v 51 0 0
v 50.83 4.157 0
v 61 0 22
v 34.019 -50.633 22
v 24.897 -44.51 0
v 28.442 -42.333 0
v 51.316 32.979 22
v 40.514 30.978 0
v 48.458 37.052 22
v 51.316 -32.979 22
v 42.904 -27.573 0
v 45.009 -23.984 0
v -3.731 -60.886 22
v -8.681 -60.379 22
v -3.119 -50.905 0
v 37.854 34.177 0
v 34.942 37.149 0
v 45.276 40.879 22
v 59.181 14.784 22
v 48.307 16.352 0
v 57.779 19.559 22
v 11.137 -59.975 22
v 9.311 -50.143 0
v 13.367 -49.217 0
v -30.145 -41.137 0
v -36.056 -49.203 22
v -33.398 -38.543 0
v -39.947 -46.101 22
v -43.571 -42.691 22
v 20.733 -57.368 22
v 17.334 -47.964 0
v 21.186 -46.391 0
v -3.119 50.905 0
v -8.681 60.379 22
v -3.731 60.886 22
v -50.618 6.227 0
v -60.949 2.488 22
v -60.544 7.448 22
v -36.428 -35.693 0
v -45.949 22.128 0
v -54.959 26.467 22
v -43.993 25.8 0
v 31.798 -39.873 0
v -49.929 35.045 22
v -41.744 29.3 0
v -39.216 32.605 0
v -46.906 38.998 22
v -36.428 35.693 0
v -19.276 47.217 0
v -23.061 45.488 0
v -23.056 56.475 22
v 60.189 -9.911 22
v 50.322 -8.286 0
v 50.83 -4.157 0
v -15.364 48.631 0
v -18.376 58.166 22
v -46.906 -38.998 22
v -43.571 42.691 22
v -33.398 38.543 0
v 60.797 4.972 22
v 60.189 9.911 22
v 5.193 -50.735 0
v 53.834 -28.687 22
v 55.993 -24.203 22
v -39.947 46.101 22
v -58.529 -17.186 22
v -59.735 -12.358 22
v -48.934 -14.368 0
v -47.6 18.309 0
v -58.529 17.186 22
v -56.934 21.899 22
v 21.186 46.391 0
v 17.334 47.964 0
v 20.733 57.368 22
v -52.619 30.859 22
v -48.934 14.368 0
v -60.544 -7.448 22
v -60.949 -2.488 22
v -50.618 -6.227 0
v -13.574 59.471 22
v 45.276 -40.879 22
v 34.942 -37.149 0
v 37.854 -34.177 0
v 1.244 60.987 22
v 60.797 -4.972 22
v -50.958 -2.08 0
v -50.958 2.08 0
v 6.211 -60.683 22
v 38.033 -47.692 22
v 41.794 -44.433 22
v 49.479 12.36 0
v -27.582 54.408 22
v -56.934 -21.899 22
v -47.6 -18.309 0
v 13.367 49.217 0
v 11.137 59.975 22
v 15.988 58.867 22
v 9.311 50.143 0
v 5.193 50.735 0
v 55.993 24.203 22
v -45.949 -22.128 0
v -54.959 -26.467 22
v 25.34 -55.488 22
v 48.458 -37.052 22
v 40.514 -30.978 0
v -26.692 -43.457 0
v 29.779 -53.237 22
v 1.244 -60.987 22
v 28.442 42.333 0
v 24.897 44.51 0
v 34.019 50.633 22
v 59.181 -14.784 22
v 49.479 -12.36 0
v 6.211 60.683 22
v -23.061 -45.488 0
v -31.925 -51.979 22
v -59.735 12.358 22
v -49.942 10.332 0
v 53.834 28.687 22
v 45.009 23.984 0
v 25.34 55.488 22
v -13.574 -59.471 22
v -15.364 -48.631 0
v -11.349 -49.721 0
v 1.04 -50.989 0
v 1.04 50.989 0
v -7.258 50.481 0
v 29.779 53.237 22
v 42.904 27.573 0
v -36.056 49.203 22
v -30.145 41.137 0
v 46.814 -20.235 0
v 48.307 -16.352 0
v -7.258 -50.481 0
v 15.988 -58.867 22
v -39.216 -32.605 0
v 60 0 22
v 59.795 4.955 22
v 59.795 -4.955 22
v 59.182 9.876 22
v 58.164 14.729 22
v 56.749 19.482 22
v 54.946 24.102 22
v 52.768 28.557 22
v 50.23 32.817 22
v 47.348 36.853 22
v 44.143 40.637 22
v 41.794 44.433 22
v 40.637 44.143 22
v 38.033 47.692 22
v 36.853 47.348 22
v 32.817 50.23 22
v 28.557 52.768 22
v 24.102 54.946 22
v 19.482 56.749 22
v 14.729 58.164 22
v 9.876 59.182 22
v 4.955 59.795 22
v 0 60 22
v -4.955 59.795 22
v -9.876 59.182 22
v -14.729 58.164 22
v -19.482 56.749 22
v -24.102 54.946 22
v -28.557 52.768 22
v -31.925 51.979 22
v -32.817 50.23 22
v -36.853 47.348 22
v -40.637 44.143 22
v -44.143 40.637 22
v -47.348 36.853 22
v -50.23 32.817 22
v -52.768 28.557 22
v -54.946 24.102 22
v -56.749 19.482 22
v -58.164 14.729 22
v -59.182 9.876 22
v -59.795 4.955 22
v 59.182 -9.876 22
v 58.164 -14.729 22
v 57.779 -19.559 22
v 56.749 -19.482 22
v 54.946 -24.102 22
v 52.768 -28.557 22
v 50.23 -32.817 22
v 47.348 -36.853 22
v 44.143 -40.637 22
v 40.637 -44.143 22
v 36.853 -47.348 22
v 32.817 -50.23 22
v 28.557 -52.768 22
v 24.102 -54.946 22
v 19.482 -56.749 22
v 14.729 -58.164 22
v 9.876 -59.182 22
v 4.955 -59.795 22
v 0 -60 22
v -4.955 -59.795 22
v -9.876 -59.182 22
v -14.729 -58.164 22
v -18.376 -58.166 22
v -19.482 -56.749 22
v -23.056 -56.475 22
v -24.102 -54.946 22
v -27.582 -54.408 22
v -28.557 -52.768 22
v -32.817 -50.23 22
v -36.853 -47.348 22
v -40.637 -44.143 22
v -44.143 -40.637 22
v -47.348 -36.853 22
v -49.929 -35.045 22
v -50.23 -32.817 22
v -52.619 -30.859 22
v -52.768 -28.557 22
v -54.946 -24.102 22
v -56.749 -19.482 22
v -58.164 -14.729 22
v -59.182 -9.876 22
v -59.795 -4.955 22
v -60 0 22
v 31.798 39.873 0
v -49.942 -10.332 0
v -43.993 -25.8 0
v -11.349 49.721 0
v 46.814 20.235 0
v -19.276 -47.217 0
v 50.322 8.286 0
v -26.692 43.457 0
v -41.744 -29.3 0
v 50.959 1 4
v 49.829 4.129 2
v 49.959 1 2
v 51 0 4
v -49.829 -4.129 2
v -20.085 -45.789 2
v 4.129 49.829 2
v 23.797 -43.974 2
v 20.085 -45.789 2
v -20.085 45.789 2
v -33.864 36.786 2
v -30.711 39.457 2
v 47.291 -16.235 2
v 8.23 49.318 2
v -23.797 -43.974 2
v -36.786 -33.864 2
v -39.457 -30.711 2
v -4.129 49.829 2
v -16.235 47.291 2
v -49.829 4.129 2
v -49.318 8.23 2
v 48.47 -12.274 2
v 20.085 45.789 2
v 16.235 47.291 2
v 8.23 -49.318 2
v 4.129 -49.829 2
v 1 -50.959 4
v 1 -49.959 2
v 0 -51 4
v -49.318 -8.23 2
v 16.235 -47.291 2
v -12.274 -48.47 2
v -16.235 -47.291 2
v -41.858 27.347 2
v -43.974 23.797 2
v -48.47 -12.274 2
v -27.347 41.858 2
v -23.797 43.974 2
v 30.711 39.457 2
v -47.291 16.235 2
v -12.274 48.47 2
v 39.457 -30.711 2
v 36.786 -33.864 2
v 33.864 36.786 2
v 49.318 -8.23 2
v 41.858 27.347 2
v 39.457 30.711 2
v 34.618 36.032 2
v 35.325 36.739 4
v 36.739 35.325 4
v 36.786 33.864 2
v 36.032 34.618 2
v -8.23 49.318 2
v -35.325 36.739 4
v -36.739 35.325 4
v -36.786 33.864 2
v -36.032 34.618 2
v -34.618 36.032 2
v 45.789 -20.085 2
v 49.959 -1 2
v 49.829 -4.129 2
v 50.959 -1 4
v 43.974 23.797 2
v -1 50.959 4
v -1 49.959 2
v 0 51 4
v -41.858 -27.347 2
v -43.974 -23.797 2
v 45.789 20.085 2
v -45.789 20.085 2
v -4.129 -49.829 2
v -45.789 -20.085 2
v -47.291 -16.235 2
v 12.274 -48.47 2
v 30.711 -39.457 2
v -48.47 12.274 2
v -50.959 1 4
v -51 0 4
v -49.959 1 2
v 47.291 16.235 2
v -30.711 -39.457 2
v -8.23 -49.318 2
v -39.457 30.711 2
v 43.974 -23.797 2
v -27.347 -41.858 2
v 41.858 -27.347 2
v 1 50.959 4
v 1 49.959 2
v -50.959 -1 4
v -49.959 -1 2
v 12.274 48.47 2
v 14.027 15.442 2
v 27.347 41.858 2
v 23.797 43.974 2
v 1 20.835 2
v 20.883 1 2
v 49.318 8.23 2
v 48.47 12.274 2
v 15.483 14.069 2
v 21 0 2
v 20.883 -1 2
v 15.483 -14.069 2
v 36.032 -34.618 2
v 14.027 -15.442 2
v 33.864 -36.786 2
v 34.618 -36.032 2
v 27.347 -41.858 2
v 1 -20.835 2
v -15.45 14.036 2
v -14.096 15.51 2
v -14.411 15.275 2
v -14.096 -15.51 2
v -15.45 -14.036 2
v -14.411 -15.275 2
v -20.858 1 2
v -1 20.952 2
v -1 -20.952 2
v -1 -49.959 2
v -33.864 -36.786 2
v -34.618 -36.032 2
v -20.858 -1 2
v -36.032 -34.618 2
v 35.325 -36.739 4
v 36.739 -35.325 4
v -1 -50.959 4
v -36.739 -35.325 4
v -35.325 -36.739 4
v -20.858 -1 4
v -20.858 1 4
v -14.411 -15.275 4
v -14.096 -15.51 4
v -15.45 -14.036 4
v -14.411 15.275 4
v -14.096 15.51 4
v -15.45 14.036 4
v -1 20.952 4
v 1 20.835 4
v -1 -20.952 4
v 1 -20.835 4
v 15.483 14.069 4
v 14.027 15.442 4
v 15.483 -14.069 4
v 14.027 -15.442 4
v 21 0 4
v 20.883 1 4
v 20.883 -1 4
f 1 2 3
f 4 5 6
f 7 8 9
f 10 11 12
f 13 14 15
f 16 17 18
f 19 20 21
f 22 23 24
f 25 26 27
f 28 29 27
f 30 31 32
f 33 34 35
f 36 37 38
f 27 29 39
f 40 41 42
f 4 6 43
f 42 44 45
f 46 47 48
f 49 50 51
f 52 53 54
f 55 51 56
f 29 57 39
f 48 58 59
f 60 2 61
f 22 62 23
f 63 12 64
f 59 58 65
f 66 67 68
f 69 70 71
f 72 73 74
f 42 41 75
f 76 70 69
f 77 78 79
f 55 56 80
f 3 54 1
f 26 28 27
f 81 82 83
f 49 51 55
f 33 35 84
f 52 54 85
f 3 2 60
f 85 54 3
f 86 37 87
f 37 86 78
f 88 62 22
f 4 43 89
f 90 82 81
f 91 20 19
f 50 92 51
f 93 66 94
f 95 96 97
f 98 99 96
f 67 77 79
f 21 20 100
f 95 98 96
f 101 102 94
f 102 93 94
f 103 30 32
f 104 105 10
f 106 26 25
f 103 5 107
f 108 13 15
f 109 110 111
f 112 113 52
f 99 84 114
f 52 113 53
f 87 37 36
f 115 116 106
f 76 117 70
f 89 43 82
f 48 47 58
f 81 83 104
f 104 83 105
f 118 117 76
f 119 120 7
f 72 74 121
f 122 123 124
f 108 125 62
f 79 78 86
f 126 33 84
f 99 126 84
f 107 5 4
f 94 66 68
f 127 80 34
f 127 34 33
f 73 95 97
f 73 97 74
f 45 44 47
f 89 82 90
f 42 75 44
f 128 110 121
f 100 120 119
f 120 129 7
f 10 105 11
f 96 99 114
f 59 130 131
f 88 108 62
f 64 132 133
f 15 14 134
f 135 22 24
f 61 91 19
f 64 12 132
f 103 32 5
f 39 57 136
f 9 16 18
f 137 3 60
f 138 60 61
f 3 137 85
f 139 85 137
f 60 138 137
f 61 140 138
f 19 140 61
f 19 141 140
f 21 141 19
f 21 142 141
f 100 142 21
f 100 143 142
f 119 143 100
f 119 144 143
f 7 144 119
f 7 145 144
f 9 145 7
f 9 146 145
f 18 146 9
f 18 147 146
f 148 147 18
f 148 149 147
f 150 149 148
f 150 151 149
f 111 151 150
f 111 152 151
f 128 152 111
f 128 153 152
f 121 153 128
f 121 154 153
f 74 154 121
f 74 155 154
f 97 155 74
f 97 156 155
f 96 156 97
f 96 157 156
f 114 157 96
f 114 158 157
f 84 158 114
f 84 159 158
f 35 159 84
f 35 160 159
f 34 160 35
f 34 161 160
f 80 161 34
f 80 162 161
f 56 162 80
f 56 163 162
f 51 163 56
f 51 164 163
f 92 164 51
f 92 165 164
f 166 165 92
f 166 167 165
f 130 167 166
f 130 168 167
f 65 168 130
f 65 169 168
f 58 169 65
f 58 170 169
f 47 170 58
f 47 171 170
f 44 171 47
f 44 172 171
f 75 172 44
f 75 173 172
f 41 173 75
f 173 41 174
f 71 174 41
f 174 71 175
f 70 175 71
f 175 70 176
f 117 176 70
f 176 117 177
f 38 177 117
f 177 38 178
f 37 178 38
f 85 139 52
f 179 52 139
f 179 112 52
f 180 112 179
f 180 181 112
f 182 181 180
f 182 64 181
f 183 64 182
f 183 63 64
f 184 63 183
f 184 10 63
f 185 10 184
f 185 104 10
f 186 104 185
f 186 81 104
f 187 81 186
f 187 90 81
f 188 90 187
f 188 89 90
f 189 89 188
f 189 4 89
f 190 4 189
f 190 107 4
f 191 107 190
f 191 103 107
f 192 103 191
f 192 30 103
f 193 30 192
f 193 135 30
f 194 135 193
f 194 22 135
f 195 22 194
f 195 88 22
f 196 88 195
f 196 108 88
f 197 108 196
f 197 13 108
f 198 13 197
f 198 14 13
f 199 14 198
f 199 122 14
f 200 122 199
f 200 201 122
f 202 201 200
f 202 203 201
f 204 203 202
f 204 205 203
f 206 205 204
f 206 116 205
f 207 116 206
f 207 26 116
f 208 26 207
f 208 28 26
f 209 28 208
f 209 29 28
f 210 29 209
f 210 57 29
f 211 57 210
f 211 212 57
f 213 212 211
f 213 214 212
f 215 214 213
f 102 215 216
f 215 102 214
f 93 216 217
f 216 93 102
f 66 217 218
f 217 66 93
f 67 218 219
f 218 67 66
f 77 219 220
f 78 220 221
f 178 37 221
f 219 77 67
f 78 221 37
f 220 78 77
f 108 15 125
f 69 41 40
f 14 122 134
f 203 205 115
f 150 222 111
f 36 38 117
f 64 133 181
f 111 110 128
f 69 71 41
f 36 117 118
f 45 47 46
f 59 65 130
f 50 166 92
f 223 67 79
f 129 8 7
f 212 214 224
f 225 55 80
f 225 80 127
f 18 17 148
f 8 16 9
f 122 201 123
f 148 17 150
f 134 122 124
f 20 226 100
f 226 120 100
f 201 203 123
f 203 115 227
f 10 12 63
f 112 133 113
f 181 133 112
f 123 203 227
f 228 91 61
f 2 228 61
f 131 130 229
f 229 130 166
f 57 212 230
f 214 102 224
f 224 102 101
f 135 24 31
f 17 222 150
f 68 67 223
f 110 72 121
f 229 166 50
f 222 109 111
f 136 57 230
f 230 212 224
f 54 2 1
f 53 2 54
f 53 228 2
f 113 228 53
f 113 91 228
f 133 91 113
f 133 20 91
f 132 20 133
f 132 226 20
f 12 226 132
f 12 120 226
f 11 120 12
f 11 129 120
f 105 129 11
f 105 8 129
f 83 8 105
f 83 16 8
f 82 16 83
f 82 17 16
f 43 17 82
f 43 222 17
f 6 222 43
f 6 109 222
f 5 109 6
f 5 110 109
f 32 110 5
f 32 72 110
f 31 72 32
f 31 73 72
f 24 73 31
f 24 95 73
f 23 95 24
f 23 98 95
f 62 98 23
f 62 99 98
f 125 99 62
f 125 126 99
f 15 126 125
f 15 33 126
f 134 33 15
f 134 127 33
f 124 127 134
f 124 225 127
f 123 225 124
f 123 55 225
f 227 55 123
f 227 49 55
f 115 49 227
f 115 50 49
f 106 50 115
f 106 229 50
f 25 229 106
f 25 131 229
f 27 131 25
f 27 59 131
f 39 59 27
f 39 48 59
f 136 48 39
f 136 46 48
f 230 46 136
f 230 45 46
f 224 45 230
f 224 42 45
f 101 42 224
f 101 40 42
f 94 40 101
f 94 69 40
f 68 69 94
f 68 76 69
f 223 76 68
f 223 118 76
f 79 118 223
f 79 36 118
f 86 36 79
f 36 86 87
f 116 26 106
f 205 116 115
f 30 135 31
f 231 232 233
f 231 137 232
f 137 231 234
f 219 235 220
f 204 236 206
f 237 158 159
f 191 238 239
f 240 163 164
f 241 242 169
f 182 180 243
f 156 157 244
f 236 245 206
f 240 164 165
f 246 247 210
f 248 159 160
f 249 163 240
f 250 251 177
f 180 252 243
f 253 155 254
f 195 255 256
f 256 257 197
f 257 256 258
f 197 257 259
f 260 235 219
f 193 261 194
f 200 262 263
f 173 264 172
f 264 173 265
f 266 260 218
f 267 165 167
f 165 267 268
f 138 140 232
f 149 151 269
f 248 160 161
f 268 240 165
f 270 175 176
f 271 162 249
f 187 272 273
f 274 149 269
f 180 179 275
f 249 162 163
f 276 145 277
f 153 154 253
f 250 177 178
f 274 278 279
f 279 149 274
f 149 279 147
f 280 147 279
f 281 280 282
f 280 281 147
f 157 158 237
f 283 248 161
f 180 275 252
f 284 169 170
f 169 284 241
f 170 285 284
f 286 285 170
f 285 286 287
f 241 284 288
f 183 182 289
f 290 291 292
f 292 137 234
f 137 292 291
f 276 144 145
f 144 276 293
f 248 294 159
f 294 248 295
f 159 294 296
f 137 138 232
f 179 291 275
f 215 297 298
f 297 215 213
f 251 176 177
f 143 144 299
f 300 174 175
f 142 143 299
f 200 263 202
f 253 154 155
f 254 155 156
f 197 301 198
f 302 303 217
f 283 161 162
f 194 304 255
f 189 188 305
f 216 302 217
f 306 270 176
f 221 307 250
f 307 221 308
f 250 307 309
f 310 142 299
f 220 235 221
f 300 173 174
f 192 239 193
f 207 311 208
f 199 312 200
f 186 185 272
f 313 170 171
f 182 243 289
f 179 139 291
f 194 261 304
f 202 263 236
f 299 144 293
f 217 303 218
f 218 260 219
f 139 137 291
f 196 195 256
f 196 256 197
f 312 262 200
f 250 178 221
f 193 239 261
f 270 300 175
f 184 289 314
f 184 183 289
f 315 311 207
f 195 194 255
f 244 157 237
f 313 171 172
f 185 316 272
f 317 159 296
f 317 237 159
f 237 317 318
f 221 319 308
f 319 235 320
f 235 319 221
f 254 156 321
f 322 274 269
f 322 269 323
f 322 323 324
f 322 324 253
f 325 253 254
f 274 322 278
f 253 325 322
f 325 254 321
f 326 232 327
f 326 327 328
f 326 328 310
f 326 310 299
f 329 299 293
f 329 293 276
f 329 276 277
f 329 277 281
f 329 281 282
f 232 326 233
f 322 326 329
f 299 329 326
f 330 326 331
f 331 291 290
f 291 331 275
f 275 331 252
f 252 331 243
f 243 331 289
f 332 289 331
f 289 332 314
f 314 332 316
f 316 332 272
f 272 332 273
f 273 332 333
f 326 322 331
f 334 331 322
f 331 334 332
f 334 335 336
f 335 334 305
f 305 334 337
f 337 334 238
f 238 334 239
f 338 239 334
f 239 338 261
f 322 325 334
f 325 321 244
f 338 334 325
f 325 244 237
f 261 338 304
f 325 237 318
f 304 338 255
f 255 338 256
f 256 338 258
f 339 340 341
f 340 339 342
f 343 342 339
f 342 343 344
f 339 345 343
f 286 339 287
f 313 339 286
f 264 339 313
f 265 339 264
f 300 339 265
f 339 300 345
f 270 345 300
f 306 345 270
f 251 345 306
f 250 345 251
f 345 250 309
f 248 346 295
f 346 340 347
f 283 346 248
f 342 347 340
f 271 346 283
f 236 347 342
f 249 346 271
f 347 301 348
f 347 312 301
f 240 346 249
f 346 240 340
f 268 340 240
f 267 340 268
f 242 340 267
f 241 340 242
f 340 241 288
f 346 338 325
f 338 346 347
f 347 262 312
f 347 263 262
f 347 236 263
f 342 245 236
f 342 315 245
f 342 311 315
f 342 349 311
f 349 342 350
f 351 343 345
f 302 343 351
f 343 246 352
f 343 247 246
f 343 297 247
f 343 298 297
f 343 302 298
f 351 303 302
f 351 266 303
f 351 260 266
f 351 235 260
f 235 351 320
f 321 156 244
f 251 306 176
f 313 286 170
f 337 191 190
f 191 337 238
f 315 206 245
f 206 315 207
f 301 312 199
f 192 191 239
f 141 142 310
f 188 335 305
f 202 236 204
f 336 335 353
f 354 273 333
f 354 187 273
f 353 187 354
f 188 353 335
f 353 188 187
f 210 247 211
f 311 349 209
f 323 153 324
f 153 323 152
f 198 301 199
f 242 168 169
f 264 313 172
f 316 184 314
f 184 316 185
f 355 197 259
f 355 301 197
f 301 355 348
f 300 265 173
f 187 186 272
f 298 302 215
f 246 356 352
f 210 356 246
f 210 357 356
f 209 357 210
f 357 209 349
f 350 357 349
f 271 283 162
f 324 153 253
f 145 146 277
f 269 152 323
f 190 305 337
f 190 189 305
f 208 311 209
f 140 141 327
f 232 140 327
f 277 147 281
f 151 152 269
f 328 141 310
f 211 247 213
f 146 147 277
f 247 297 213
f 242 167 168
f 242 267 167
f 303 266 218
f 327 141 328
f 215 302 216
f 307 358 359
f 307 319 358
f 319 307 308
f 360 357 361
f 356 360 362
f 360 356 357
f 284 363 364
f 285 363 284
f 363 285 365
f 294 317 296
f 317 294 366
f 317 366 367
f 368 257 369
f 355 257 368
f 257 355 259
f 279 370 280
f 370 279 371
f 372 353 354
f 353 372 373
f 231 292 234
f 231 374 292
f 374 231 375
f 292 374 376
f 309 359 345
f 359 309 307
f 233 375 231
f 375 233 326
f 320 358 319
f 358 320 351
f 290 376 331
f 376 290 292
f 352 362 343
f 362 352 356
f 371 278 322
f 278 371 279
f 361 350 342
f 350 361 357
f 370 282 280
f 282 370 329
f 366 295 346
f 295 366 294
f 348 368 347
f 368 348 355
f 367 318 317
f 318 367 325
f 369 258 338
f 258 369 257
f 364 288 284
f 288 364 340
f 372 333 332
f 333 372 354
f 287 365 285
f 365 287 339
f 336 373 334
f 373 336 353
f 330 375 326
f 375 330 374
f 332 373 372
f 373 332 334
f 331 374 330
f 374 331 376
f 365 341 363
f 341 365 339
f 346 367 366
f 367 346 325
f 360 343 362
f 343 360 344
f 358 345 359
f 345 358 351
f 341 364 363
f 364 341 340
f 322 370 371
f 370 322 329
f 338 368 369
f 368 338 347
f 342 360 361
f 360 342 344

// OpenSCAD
$fs=5;
$fa=0.5;

module saucer()
{
  difference()
  {
    cylinder(h=22, r1=102/2, r2=122/2);
    translate([0, 0, 2])
      cylinder(h=20, r1=100/2, r2=120/2);
  }
  difference()
  {
    for(rz=[0, 45, 90, 135])
      rotate([0, 0, rz])
        translate([-102/2, -2/2, 2])
          cube([102, 2, 2]);
    cylinder(r=(102-2*30)/2, h=5);
  }
}

saucer();
